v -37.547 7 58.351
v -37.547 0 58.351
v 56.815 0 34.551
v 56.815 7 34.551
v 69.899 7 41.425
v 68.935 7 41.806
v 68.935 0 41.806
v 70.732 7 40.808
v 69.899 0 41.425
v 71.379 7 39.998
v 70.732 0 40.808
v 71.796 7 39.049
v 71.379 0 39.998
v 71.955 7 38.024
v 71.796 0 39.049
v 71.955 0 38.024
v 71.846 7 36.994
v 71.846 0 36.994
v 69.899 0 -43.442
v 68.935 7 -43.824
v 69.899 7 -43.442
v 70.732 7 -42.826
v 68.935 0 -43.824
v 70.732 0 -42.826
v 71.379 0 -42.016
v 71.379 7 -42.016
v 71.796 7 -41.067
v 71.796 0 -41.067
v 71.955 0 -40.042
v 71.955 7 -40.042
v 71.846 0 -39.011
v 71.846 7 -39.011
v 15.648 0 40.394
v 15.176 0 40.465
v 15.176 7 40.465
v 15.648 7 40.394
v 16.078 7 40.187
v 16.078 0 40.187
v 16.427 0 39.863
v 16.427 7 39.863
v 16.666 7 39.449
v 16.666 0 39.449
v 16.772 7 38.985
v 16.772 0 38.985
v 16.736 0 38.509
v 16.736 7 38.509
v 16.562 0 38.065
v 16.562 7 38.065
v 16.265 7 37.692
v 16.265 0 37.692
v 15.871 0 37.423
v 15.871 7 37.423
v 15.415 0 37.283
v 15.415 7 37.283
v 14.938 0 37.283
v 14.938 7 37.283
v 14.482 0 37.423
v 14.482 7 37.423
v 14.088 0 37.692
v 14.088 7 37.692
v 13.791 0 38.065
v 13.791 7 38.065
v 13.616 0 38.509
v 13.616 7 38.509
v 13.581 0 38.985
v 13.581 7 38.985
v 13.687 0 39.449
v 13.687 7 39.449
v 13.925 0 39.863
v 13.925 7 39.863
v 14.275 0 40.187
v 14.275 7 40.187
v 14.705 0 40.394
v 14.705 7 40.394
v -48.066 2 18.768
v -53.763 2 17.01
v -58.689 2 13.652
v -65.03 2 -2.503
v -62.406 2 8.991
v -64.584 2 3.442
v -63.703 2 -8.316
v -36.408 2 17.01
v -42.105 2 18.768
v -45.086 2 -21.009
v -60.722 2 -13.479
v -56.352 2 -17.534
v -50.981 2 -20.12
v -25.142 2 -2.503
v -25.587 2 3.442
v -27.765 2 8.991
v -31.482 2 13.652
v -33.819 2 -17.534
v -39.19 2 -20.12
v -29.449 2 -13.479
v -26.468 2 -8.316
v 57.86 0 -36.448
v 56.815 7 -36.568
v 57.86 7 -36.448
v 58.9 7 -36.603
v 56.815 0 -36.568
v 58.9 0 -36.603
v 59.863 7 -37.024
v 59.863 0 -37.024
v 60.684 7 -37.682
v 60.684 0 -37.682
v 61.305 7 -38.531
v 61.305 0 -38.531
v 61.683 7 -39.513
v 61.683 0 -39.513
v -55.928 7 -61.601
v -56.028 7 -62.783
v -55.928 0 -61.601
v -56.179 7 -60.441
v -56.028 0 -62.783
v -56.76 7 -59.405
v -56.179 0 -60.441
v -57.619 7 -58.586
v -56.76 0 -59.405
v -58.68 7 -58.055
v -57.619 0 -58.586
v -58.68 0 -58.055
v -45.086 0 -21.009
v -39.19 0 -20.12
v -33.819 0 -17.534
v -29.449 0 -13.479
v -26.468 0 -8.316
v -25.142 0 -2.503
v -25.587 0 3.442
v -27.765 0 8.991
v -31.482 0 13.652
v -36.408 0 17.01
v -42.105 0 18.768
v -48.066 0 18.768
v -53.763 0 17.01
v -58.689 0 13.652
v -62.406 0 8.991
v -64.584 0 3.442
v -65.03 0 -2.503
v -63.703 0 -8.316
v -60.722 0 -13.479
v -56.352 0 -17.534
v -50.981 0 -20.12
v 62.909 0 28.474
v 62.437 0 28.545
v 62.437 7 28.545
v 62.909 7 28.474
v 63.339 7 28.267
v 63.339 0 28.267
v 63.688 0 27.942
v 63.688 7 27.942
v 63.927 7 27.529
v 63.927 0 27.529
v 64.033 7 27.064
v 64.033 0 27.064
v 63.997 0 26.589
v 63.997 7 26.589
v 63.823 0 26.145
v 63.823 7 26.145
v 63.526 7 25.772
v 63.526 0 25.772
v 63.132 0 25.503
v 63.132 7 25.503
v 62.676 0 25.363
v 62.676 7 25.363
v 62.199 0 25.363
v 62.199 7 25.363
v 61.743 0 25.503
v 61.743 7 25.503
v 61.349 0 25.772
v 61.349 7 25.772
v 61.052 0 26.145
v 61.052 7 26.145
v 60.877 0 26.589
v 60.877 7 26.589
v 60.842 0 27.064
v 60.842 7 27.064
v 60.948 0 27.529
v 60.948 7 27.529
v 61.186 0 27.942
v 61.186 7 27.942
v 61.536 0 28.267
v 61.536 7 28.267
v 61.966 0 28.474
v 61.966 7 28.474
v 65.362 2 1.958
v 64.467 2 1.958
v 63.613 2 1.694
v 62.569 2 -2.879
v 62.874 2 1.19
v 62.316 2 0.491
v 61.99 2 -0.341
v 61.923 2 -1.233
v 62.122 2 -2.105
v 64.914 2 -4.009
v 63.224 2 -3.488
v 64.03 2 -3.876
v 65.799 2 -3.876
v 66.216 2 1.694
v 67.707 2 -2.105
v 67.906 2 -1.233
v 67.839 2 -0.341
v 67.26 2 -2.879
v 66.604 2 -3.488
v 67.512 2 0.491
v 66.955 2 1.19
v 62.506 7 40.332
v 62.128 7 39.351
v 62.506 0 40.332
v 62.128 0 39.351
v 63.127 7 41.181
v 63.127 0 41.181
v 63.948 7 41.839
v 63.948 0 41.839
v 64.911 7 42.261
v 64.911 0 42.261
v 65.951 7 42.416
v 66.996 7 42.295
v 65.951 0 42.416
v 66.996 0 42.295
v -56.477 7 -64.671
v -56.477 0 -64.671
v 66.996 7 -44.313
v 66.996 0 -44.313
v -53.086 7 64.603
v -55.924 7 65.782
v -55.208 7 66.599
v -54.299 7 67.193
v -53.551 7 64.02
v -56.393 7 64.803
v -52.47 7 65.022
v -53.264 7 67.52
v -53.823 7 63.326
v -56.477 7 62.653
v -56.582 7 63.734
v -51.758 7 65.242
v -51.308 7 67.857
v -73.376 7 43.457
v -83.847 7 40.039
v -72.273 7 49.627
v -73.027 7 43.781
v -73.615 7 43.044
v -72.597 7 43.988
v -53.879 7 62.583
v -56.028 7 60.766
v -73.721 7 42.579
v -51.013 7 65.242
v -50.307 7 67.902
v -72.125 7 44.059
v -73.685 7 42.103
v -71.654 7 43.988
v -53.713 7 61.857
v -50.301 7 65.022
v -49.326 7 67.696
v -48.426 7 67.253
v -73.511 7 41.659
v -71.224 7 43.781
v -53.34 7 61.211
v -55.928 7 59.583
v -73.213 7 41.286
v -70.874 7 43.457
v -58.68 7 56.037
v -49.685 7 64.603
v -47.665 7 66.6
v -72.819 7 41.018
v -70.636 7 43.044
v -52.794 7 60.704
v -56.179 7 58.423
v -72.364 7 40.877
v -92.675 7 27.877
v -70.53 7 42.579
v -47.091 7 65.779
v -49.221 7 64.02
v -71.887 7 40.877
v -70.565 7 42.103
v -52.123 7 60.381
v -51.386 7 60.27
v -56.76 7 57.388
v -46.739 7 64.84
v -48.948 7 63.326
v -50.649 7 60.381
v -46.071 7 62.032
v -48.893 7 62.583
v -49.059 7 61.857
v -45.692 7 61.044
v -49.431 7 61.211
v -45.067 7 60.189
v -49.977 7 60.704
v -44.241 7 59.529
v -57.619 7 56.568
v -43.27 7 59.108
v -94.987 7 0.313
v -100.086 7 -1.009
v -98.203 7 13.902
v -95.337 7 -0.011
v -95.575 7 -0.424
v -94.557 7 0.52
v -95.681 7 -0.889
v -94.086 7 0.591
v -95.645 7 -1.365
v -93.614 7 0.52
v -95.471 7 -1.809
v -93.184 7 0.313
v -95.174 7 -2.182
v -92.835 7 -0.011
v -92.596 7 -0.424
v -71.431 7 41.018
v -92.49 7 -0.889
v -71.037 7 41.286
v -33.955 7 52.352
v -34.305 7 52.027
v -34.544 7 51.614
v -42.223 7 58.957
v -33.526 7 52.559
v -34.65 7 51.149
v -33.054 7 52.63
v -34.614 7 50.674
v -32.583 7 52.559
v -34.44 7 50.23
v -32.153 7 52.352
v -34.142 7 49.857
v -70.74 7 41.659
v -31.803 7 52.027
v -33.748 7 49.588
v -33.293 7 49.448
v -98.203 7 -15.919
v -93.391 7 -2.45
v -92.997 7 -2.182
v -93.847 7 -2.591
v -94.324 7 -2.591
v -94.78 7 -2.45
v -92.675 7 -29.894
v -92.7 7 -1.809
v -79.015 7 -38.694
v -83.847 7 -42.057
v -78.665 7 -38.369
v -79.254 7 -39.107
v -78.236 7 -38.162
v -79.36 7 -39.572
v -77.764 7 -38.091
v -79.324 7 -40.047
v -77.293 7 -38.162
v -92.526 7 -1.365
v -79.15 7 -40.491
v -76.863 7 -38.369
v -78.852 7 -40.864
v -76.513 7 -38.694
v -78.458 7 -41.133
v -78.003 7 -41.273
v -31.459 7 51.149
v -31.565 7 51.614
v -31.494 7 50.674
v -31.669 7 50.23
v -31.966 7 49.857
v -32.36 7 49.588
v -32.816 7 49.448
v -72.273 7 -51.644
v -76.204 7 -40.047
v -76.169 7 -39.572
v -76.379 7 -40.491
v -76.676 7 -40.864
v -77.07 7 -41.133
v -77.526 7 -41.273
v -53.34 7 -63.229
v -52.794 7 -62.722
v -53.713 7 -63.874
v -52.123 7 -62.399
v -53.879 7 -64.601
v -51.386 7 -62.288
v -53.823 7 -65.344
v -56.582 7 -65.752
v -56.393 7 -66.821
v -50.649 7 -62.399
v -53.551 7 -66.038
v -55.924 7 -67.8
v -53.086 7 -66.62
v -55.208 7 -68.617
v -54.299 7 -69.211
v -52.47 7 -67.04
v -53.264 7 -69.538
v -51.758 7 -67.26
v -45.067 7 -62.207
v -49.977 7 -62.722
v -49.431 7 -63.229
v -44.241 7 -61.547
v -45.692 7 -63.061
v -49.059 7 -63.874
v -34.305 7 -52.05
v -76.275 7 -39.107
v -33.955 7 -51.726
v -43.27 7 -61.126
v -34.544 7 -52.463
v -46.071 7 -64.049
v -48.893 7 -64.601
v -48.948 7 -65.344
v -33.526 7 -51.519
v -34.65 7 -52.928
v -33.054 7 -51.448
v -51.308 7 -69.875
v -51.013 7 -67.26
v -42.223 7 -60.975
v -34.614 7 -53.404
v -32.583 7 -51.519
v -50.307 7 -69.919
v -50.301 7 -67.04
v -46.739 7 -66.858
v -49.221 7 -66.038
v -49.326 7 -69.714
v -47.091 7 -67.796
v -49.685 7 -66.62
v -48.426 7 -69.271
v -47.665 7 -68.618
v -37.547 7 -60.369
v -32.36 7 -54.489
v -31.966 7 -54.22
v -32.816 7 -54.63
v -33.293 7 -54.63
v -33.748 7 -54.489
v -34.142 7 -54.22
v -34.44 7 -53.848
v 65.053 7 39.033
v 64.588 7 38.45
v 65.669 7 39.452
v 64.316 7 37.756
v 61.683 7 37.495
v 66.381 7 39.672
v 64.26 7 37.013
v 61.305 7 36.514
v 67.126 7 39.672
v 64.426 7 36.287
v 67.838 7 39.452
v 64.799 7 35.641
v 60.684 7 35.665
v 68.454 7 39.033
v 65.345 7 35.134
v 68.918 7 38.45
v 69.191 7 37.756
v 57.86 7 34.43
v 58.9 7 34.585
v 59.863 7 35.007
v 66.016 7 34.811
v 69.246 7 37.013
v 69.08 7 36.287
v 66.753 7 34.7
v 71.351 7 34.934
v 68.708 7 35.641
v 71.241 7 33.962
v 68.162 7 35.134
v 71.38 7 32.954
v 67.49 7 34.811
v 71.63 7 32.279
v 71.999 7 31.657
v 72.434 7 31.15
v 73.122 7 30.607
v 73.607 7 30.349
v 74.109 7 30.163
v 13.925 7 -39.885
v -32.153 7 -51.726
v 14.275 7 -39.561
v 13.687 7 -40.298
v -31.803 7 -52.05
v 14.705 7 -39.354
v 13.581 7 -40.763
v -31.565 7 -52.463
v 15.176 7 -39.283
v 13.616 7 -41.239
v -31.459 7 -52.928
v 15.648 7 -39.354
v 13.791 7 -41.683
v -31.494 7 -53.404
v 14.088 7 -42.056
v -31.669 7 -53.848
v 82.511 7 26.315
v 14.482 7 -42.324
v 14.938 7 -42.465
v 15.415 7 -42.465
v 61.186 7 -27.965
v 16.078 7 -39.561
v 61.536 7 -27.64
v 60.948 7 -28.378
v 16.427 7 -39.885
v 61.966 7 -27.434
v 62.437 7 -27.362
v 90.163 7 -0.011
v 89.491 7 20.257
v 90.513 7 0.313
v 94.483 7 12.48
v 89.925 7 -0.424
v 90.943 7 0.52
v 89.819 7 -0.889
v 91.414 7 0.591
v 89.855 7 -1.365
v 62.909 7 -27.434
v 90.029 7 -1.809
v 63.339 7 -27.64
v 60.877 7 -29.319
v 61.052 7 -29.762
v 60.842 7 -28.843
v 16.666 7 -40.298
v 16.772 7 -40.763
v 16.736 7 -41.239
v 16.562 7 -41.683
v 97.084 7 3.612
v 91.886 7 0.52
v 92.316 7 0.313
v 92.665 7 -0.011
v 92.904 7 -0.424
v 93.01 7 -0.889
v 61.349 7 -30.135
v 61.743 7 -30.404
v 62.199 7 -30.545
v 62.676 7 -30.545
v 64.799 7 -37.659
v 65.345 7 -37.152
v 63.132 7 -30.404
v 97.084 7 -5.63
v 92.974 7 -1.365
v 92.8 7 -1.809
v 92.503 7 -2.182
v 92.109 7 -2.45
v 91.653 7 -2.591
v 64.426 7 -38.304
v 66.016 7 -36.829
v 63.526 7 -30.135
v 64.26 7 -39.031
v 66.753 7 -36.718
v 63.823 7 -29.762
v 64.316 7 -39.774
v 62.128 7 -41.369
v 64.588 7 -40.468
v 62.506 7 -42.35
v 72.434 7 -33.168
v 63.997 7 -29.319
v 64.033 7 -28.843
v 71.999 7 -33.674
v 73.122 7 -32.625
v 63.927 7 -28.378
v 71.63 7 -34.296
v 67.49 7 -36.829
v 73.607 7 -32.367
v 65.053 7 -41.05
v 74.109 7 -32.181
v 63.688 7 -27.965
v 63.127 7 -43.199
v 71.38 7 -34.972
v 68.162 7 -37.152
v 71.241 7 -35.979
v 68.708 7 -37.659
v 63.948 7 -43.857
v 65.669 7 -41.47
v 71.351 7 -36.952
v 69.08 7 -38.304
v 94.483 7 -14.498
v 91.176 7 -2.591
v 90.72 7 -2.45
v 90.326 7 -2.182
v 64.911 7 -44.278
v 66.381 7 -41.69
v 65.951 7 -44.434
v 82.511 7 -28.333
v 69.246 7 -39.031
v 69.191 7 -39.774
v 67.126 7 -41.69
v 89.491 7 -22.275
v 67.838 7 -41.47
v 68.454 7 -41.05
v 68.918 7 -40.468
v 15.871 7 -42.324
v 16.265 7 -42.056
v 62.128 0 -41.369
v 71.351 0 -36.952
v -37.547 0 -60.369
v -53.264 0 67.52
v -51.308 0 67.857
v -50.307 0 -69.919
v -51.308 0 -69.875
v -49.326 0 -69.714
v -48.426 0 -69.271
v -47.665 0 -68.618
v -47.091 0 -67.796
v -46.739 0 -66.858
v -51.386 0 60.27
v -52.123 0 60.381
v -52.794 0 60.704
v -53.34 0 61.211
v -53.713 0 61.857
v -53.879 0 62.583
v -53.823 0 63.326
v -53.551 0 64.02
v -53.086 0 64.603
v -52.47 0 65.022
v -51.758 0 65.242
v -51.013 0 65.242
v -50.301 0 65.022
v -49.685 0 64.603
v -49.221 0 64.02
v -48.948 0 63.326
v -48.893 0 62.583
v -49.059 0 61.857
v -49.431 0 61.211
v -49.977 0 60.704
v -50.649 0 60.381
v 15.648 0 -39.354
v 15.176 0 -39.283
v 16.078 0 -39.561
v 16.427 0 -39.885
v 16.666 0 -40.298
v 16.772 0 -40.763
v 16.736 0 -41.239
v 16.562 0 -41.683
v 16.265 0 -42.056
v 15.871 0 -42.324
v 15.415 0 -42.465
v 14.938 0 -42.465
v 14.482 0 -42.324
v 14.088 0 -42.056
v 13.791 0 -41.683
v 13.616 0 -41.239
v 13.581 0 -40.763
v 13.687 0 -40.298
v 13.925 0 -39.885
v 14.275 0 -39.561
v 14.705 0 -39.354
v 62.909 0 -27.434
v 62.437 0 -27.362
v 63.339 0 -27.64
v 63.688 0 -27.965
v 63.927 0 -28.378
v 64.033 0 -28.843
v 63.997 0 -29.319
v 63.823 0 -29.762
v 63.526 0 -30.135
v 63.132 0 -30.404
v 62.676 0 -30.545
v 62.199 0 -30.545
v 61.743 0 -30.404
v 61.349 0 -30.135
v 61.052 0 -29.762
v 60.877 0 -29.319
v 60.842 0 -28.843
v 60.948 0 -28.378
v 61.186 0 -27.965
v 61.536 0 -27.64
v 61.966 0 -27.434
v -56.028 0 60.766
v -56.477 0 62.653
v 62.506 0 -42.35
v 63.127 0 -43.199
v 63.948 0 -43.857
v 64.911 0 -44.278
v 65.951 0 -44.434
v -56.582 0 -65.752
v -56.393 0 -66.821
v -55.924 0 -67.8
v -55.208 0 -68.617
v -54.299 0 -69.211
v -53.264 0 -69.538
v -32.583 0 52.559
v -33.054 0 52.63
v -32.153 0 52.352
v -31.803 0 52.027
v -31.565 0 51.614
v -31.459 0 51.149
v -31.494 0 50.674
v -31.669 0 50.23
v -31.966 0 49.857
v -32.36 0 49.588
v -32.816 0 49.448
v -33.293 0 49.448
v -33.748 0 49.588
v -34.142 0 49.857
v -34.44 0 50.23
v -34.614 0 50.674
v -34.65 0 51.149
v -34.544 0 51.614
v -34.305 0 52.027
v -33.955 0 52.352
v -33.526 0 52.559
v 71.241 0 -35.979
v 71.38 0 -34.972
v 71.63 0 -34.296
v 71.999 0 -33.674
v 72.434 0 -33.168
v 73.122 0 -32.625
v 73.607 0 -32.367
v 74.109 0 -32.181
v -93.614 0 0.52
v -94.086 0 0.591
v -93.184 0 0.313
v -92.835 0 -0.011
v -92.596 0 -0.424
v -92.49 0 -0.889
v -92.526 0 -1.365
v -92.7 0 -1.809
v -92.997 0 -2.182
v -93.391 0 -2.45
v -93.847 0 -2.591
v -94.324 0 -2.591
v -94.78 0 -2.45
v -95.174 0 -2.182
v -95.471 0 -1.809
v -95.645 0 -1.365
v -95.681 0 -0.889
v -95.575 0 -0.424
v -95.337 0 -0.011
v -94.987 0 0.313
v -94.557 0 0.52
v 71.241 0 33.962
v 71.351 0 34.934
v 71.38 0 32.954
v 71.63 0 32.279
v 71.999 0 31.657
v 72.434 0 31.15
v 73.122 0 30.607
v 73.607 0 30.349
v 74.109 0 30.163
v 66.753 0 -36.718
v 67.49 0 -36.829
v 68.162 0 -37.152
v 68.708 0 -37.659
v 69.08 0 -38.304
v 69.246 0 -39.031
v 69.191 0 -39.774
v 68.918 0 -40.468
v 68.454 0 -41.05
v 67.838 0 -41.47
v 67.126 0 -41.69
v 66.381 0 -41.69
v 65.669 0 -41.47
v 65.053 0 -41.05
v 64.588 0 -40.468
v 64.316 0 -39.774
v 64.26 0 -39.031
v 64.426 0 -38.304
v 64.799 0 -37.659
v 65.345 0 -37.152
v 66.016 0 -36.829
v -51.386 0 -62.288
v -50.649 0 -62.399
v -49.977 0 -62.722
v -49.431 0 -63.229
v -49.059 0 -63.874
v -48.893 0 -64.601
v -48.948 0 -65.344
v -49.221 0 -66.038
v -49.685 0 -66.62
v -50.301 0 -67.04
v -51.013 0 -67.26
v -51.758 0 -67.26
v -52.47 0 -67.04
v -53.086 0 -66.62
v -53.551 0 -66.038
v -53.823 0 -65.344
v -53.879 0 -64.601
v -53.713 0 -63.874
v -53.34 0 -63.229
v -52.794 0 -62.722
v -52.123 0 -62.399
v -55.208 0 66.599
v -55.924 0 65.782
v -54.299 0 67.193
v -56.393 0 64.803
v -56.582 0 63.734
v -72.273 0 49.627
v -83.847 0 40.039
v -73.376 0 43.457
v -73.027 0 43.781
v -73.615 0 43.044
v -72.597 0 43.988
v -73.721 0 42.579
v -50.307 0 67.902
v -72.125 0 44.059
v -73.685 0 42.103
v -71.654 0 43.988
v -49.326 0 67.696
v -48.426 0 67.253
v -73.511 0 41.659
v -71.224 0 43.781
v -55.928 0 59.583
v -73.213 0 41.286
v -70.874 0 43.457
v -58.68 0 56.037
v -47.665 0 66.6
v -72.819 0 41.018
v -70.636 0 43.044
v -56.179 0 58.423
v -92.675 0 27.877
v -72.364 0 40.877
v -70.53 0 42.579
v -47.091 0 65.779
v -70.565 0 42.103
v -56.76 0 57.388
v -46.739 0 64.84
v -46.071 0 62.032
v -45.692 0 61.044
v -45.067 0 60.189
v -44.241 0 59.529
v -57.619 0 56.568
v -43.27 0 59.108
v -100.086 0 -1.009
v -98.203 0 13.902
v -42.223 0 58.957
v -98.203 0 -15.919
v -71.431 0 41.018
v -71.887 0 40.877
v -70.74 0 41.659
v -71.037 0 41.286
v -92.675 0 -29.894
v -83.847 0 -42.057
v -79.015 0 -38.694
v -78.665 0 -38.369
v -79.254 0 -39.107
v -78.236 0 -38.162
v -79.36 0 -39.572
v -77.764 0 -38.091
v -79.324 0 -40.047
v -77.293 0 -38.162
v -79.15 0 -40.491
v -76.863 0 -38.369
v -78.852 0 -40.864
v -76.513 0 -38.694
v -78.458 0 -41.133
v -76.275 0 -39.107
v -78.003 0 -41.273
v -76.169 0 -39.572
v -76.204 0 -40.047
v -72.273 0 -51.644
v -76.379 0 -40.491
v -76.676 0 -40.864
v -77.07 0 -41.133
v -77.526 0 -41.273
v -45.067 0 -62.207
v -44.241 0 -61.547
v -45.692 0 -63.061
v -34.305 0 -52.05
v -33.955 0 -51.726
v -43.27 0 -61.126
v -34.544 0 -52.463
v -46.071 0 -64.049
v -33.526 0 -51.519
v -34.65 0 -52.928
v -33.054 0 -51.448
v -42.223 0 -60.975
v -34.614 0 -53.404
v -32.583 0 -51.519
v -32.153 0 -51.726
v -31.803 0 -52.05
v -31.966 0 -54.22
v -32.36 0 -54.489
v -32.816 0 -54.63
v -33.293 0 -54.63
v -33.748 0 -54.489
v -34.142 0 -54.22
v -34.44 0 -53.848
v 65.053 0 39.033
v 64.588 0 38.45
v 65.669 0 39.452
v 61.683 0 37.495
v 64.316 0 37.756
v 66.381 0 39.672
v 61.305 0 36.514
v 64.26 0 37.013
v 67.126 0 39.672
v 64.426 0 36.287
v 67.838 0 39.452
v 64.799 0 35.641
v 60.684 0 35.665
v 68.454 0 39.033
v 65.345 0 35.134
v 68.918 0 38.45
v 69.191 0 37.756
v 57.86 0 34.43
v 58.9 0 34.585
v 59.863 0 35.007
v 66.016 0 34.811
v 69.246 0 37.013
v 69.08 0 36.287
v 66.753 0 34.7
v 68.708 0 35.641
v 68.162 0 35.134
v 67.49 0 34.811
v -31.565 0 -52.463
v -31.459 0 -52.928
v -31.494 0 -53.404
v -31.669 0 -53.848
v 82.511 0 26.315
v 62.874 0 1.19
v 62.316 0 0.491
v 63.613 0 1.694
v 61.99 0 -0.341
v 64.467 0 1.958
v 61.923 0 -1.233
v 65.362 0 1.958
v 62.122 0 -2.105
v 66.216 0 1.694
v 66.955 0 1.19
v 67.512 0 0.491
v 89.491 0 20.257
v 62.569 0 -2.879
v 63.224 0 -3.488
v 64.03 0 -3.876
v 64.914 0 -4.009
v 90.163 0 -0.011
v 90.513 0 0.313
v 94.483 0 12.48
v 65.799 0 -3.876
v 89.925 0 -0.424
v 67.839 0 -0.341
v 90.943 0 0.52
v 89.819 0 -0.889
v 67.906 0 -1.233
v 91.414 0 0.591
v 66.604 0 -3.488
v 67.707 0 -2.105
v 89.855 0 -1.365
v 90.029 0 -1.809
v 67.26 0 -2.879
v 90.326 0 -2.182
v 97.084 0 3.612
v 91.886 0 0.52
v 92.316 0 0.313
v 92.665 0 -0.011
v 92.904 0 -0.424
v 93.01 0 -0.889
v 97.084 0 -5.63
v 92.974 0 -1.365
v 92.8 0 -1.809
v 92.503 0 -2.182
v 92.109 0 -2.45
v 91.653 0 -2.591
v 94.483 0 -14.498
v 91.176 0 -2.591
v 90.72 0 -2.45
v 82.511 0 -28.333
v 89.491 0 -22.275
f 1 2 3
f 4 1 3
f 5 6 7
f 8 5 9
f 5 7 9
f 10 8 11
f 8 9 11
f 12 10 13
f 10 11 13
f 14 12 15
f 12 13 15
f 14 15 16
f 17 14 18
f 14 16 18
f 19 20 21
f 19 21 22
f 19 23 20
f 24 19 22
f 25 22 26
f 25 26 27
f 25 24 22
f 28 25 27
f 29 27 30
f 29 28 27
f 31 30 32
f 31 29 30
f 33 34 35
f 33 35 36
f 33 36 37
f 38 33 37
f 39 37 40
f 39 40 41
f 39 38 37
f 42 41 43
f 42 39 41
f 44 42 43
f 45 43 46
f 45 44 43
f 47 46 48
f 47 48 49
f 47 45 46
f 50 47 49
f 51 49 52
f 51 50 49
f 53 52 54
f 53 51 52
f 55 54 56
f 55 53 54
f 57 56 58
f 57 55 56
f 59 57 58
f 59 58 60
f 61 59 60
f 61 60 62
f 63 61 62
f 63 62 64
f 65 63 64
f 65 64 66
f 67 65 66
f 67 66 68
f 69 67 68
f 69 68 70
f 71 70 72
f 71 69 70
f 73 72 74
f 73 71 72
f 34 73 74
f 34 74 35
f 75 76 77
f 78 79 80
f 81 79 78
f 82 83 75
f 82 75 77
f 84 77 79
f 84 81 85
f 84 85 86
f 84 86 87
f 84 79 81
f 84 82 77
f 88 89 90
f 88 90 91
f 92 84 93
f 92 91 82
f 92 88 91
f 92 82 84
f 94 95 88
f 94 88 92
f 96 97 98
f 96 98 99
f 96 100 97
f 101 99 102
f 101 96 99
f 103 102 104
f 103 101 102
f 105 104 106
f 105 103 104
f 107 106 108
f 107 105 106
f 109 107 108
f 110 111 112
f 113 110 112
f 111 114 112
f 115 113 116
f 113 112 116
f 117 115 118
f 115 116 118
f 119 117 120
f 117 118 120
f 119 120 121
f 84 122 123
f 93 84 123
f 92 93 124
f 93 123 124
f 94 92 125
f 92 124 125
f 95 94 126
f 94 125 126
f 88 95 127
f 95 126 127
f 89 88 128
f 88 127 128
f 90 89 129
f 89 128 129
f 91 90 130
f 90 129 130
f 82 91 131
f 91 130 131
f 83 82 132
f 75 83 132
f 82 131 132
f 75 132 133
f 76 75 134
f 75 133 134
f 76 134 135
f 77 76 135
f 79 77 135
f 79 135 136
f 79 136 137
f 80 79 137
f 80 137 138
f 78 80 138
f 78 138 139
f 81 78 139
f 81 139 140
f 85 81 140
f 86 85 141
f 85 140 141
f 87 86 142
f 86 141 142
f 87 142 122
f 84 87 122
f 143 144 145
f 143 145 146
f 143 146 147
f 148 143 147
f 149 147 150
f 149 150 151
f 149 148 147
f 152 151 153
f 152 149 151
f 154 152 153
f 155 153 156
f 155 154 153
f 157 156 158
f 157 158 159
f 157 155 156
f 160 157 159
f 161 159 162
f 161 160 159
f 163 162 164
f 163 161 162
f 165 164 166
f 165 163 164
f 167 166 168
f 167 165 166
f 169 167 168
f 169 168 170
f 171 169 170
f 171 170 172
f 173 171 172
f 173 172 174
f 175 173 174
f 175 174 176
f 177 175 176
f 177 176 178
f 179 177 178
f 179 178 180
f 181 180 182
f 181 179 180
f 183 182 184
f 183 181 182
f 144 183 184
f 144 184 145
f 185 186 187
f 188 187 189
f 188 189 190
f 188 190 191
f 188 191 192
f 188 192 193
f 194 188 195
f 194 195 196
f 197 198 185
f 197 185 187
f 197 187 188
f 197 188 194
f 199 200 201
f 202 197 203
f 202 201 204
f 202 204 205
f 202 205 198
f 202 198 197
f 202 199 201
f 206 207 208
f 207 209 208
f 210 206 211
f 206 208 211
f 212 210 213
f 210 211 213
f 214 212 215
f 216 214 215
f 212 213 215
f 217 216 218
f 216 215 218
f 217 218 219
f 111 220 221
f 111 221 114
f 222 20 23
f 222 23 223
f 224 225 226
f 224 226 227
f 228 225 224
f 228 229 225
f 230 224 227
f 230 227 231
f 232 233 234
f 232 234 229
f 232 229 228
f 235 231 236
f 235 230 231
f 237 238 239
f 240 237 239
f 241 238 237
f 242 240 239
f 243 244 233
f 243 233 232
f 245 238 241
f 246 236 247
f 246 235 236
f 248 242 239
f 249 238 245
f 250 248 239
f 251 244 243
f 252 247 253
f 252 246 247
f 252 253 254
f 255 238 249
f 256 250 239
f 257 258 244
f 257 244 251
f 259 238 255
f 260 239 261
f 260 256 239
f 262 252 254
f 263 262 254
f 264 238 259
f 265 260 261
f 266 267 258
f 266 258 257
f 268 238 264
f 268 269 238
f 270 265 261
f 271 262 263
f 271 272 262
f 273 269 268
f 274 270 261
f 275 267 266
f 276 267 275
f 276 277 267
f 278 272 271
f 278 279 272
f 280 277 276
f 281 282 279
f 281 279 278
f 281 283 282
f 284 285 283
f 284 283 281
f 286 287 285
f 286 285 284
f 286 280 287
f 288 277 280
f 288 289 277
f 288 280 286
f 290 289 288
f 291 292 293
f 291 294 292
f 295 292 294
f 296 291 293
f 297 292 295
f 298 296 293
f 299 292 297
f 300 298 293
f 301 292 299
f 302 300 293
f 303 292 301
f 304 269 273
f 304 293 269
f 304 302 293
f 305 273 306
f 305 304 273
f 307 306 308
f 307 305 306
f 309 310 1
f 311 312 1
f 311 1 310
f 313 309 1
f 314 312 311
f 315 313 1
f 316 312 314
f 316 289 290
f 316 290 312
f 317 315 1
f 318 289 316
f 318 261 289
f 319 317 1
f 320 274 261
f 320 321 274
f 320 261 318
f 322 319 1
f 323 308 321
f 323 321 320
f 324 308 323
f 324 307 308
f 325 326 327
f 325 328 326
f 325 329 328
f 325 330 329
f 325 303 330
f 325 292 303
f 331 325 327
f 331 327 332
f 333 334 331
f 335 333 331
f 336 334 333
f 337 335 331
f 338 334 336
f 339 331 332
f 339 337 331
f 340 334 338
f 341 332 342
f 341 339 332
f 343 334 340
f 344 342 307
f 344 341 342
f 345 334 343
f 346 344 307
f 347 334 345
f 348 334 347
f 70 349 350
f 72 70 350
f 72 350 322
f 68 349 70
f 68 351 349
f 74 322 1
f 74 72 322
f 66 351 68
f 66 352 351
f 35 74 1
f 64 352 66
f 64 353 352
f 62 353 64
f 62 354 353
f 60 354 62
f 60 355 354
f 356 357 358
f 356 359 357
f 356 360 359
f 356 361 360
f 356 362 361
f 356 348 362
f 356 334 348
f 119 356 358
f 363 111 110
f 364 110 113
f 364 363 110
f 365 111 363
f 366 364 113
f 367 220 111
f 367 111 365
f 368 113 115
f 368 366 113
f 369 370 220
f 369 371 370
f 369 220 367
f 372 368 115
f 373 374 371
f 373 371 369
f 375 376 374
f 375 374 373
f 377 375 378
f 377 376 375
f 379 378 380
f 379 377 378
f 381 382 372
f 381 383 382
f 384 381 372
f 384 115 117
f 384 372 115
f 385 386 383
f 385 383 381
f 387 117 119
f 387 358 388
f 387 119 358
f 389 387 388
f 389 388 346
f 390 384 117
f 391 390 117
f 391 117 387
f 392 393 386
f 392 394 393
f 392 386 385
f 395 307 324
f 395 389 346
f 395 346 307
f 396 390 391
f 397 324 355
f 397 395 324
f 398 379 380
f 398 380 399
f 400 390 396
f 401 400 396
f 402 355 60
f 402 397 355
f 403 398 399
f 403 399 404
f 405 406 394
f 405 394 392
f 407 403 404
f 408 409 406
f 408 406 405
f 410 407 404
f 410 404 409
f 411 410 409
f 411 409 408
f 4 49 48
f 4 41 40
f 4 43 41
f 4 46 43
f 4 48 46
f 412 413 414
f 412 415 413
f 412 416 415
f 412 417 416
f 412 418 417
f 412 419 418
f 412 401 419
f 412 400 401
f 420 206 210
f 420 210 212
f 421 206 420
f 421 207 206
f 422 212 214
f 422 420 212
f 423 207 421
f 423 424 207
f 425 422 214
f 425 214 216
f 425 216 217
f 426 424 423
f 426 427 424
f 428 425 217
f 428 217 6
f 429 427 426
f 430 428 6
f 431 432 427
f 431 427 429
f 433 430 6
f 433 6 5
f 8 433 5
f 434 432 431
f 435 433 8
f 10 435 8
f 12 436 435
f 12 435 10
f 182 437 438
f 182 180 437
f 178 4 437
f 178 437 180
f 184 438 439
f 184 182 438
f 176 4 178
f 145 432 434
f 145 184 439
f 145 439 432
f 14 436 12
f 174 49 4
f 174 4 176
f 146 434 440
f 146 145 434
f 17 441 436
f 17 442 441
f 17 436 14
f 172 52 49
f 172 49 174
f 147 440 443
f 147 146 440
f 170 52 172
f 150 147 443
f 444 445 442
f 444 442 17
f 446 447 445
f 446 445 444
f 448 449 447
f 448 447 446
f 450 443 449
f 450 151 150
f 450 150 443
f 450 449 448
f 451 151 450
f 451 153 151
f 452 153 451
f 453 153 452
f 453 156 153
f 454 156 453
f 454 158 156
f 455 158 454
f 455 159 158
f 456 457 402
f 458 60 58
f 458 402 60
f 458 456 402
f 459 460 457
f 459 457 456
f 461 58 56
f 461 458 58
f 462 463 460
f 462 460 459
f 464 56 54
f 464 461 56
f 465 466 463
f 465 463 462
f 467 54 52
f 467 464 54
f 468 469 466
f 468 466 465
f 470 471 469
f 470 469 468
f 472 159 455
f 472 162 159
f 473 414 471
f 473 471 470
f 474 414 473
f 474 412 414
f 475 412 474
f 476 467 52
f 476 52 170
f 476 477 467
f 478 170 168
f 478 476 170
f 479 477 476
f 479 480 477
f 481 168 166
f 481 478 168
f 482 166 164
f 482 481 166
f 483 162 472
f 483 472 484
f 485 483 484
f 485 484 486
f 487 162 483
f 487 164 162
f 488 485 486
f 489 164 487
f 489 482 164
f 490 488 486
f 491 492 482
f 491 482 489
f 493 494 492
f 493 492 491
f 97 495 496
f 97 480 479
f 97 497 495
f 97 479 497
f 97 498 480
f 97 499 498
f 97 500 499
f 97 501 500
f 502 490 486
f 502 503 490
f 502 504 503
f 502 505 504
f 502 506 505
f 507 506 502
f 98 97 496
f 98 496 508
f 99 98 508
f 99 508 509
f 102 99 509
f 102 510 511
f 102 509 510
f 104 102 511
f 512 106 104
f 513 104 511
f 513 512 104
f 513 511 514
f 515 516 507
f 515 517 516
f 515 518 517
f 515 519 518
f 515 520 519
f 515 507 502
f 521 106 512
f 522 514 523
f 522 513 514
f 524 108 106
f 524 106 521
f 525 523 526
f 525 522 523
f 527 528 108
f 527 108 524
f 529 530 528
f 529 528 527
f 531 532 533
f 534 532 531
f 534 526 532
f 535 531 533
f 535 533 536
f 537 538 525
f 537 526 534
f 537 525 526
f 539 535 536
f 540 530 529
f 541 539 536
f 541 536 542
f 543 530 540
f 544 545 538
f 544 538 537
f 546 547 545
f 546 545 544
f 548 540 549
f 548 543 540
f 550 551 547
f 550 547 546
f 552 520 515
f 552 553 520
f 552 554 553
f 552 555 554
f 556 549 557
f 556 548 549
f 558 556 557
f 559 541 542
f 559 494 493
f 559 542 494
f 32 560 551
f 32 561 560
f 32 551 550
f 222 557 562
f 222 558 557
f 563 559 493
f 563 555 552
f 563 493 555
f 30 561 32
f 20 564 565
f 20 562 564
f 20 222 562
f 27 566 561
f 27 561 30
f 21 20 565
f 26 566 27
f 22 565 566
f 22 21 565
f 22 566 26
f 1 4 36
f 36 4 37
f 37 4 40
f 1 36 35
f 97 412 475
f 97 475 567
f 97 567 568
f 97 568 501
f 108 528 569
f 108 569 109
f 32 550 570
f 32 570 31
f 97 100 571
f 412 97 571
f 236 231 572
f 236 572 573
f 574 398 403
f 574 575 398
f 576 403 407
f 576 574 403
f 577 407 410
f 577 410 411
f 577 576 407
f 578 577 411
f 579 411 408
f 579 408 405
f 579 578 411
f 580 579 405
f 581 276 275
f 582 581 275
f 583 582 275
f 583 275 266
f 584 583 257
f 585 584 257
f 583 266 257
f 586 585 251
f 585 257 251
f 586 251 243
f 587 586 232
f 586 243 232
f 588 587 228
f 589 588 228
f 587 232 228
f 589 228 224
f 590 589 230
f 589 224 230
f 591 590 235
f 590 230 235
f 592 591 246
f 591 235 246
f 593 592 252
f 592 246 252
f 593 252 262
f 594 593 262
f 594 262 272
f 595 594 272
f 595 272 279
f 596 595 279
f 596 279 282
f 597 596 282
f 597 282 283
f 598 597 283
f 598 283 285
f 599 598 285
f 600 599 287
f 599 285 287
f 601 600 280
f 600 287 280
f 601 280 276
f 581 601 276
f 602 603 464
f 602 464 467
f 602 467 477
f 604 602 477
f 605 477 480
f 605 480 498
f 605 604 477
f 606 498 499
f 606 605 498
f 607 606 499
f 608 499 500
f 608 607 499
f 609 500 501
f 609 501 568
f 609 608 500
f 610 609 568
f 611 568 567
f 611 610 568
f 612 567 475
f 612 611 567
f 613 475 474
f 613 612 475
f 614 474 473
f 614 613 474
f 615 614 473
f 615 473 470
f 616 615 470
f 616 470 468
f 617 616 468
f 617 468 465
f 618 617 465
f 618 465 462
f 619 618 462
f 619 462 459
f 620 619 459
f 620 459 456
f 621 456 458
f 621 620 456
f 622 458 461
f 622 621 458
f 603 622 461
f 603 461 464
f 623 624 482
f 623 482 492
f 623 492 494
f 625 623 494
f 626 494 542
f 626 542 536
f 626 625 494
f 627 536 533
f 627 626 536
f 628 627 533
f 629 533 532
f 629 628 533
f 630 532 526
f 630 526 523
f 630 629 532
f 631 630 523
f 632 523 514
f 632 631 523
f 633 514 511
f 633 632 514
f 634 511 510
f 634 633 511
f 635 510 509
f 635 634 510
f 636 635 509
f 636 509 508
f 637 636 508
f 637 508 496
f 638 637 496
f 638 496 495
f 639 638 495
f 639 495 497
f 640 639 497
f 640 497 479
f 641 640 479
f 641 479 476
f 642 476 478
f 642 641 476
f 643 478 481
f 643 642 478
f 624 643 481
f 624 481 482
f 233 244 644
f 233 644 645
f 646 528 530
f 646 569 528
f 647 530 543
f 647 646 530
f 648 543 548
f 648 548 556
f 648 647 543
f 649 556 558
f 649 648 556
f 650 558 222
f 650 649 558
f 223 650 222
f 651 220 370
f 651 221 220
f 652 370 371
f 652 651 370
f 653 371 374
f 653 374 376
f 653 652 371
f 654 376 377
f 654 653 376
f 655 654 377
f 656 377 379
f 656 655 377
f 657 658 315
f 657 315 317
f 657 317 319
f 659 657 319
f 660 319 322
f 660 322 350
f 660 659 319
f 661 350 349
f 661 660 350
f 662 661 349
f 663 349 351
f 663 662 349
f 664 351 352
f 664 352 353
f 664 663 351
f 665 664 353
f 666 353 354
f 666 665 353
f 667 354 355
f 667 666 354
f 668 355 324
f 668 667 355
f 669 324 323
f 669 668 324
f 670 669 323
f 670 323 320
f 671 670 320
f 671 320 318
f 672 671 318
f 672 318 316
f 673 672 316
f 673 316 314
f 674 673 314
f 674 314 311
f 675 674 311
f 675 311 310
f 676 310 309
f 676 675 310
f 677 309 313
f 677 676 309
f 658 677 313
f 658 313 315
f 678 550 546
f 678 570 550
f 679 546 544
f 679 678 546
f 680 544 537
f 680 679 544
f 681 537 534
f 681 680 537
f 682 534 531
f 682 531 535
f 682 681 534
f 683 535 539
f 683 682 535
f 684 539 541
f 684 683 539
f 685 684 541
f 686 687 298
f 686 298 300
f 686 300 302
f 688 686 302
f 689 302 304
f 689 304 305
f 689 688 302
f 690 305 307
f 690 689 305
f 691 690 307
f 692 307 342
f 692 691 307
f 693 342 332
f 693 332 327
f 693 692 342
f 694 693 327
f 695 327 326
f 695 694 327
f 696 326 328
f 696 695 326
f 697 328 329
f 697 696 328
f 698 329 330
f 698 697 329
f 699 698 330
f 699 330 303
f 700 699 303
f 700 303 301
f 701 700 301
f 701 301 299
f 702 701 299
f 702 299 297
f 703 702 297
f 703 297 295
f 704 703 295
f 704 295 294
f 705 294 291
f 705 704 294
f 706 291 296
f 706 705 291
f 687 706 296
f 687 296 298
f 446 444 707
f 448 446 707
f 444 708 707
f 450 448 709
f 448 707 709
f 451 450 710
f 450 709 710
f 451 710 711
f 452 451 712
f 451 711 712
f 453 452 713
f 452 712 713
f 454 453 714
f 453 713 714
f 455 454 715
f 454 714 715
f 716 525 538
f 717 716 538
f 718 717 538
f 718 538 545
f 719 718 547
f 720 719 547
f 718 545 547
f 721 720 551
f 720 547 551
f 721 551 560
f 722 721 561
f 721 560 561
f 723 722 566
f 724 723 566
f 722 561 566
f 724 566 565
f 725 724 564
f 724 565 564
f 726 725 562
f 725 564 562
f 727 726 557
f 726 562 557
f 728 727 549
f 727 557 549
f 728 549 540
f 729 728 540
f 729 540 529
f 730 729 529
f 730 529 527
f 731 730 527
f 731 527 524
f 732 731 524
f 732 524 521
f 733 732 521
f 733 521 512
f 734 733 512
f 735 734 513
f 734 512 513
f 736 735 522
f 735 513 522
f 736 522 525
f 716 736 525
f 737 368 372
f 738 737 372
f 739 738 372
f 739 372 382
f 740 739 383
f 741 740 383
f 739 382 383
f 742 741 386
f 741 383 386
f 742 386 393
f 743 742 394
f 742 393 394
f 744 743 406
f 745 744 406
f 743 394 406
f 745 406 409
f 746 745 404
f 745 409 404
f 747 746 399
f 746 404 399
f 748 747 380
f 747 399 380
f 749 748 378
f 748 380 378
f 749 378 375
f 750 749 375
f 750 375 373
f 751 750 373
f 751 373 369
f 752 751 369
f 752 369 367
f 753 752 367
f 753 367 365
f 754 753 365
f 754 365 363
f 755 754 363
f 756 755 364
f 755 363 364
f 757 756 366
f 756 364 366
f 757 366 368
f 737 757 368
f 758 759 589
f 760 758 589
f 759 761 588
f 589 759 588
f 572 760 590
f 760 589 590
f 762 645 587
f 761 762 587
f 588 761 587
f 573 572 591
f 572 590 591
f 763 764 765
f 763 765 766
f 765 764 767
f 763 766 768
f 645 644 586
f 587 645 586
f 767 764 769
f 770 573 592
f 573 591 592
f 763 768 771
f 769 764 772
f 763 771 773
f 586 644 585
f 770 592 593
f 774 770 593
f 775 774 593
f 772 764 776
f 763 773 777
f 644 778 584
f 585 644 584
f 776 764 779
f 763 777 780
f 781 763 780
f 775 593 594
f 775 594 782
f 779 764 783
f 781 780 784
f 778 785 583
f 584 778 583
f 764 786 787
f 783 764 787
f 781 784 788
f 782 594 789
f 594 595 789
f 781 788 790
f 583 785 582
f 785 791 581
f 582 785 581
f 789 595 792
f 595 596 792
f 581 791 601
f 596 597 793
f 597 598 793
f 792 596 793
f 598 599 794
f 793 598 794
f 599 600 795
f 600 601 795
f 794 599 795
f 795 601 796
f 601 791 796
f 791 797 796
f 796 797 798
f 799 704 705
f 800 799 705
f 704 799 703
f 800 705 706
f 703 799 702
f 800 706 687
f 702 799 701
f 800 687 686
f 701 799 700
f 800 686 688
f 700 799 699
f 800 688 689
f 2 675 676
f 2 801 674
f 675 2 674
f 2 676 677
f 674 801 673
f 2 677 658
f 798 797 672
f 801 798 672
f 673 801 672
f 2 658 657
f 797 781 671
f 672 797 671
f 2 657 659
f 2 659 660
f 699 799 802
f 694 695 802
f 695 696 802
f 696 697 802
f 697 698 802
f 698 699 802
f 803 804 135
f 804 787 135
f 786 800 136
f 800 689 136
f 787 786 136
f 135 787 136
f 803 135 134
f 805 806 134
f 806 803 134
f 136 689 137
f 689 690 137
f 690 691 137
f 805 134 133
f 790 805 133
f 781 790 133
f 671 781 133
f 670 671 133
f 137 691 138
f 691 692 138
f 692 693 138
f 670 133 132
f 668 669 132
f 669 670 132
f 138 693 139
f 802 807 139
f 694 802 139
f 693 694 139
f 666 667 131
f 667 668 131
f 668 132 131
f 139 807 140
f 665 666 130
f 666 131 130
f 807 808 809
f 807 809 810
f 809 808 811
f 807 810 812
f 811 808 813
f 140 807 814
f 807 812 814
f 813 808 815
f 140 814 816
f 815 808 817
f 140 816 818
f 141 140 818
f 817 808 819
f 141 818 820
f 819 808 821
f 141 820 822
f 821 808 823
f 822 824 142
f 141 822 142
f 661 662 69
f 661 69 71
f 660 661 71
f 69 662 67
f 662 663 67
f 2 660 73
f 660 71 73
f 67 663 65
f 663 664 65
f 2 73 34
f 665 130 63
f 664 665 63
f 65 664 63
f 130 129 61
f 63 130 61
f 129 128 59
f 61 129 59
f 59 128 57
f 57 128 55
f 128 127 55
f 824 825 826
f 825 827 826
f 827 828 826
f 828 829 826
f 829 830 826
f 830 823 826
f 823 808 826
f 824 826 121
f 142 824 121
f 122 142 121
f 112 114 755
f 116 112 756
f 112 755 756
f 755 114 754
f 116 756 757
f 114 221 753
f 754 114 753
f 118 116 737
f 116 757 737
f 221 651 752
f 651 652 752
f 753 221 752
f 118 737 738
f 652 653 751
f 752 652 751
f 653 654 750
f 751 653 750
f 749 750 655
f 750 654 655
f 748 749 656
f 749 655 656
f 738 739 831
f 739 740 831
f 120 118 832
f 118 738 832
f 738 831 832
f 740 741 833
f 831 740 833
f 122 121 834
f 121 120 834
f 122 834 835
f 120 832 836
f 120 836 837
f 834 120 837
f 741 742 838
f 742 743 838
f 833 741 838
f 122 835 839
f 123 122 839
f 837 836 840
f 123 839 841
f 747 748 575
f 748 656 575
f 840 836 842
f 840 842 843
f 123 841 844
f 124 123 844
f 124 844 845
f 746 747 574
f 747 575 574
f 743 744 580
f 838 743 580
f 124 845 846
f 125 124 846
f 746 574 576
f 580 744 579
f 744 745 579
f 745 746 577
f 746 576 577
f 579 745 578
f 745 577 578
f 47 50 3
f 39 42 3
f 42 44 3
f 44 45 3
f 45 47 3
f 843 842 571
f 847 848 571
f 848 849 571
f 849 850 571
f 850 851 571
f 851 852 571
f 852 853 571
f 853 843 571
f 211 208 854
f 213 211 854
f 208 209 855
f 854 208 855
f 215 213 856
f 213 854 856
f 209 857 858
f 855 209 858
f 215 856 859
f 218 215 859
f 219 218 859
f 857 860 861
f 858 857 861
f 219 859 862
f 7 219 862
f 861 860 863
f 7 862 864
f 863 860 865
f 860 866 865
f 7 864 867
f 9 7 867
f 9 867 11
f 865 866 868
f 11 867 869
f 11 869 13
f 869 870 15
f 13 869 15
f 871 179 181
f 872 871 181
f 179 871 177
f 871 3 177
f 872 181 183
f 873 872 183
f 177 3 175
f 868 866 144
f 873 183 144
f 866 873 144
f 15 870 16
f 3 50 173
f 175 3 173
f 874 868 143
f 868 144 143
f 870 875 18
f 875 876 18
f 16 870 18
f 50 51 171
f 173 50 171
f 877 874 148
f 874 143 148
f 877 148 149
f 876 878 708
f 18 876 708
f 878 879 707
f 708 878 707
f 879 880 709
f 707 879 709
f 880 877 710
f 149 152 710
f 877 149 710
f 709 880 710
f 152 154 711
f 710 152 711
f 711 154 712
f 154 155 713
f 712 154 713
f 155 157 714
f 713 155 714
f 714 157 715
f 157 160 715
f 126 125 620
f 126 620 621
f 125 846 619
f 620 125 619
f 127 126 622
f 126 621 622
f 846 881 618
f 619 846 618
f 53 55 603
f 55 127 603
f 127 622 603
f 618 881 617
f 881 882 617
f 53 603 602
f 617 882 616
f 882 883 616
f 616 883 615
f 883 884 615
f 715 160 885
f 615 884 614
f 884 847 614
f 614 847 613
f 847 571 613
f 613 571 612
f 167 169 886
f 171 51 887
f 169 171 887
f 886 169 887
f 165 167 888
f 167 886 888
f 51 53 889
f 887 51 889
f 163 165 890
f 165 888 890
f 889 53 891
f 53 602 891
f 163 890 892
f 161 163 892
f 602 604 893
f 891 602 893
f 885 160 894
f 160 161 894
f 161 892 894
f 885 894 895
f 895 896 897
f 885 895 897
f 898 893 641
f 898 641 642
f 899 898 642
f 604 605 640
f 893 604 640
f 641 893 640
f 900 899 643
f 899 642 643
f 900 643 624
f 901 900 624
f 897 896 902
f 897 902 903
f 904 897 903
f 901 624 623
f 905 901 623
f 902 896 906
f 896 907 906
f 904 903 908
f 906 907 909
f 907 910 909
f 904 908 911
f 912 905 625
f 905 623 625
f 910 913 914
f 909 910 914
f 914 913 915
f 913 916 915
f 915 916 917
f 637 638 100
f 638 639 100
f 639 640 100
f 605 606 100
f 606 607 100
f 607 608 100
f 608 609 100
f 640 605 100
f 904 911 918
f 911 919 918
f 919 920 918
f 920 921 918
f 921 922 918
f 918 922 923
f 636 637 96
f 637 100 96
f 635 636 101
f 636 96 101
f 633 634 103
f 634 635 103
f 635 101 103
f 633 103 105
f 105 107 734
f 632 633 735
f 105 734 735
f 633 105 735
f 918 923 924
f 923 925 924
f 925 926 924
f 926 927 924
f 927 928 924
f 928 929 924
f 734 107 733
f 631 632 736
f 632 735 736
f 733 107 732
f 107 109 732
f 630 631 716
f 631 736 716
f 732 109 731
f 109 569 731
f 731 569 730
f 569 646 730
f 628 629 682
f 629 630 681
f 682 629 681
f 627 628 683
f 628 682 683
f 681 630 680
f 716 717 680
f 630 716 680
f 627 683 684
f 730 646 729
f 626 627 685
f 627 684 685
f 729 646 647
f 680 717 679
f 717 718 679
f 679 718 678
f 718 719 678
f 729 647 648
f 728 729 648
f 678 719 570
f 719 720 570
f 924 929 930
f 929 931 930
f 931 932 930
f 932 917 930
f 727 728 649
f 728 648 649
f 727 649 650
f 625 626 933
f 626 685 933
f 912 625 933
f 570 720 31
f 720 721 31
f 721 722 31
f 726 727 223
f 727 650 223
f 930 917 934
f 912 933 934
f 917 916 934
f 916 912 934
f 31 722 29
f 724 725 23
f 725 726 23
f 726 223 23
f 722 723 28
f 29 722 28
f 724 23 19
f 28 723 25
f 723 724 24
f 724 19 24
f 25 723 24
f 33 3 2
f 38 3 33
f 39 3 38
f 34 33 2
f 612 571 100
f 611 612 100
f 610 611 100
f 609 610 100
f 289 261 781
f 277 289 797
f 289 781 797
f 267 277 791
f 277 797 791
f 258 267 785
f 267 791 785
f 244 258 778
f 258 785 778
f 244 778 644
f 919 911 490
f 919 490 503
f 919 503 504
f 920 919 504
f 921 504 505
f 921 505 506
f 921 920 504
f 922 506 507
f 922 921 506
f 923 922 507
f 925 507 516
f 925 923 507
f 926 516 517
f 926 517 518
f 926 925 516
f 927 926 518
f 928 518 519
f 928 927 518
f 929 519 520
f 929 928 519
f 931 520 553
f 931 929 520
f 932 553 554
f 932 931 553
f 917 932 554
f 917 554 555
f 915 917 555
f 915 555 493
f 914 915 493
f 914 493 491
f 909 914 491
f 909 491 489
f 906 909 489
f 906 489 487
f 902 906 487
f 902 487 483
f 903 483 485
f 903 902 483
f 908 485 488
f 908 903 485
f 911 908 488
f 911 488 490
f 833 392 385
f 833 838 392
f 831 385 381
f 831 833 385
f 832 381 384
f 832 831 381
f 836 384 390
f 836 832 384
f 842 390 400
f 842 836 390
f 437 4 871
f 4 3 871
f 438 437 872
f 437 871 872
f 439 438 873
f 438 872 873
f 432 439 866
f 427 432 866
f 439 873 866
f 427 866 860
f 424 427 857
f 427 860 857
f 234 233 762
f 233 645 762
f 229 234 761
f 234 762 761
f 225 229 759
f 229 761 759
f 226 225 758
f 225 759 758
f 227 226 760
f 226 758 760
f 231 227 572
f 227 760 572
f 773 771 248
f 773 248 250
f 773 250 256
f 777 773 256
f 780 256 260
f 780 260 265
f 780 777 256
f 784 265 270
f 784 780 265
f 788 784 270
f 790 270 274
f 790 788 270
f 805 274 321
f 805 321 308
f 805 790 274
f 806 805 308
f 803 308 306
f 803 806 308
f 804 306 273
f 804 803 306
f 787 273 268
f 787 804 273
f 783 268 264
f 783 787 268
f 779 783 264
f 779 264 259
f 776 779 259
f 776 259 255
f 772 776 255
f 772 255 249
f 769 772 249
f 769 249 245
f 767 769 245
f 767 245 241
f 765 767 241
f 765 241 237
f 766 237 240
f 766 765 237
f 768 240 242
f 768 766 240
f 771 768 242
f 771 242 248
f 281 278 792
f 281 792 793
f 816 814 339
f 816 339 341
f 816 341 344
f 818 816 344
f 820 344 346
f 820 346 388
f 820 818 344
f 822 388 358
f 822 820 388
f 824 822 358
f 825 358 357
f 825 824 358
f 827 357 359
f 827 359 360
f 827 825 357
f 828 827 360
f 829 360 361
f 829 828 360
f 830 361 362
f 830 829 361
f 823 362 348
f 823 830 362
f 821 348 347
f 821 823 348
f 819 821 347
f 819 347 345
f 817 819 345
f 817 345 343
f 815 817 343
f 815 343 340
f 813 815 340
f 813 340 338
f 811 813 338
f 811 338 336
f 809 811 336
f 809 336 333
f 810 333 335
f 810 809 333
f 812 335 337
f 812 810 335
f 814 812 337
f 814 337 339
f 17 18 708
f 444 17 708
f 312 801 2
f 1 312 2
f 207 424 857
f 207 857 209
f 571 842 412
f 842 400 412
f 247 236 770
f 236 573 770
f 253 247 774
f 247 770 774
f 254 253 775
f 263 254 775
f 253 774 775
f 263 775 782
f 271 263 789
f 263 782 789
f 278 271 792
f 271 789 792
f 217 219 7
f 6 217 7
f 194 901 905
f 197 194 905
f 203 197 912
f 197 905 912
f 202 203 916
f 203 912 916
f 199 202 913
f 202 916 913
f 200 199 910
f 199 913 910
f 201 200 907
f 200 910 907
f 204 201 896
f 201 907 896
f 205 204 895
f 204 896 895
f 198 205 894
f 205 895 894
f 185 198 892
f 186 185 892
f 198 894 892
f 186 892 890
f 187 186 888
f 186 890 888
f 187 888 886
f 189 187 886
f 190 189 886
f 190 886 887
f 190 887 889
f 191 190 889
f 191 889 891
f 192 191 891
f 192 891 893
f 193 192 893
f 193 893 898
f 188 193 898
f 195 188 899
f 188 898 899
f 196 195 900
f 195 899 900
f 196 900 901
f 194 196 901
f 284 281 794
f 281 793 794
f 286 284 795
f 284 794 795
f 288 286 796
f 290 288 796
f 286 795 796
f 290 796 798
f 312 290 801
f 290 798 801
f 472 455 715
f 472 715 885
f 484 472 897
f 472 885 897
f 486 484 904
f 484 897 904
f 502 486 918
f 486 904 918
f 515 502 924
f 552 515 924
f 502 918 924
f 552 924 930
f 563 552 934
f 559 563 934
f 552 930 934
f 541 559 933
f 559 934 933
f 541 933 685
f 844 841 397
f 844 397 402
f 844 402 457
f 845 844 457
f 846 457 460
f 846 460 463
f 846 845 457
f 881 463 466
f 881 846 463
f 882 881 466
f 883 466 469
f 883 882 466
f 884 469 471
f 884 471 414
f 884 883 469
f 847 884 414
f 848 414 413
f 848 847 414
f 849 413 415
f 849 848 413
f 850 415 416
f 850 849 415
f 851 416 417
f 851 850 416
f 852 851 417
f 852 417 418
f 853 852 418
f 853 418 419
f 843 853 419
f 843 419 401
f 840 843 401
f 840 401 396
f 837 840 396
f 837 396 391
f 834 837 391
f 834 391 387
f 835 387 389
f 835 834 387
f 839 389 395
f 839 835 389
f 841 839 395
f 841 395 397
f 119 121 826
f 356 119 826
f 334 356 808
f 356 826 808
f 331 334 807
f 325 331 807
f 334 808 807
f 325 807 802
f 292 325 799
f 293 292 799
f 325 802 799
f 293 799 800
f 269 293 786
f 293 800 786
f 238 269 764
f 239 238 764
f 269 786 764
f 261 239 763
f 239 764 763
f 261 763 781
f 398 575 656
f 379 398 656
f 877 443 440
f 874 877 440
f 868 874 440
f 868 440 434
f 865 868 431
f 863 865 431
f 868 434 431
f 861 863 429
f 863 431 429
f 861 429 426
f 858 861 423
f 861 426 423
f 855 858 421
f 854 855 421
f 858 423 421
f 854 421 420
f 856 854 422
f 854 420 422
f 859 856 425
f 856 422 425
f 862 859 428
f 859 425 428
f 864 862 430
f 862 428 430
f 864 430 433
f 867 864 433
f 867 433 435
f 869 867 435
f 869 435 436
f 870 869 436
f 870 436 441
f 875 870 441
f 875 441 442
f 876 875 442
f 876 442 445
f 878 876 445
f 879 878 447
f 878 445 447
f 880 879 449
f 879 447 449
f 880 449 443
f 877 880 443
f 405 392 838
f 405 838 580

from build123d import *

# Parameters (mm, degrees)
SKETCH1_R           = 1.6
BOSS_EXTRUDE1_DEPTH = 7
BOSS_EXTRUDE2_DEPTH = 7
SKETCH3_R           = 2.5
CUT_EXTRUDE1_DEPTH  = 7
FILLET1_R           = 4
FILLET2_R           = 20
SKETCH5_R           = 20
SKETCH5_R_2         = 3
CUT_EXTRUDE3_DEPTH  = 2


with BuildPart() as part:
    # Sketch1 → Boss-Extrude1 (new body)
    with BuildSketch(Plane(origin=(0, 0, 0), x_dir=(1, 0, 0), z_dir=(0, 1, 0))):
        with BuildLine():
            Line((-40.085587865, -58.991121495), (72.606562154, -30.567708203))
            ThreePointArc((72.606562154, -30.567708203), (97.414412135, 1.008878505), (72.606562154, 32.585465212))
            Line((72.606562154, 32.585465212), (-40.085587865, 61.008878505))
            ThreePointArc((-40.085587865, 61.008878505), (-100.085587865, 1.008878505), (-40.085587865, -58.991121495))
        make_face()
        with Locations(Location((15.176377483, -38.864945804, 0), (0, 0, 270))):
            Circle(SKETCH1_R, mode=Mode.SUBTRACT)
        with Locations(Location((-33.054187001, -51.02974404, 0), (0, 0, 270))):
            Circle(SKETCH1_R, mode=Mode.SUBTRACT)
        with Locations(Location((62.43730848, -26.944710242, 0), (0, 0, 270))):
            Circle(SKETCH1_R, mode=Mode.SUBTRACT)
        with Locations(Location((91.414412135, 1.008878505, 0), (0, 0, 270))):
            Circle(SKETCH1_R, mode=Mode.SUBTRACT)
        with Locations(Location((-33.054187001, 53.047501049, 0), (0, 0, 270))):
            Circle(SKETCH1_R, mode=Mode.SUBTRACT)
        with Locations(Location((15.176377483, 40.882702814, 0), (0, 0, 270))):
            Circle(SKETCH1_R, mode=Mode.SUBTRACT)
        with Locations(Location((62.43730848, 28.962467251, 0), (0, 0, 270))):
            Circle(SKETCH1_R, mode=Mode.SUBTRACT)
        with Locations(Location((-94.085587865, 1.008878505, 0), (0, 0, 270))):
            Circle(SKETCH1_R, mode=Mode.SUBTRACT)
        with Locations(Location((-72.125195915, -42.459081144, 0), (0, 0, 270))):
            Circle(SKETCH1_R, mode=Mode.SUBTRACT)
        with Locations(Location((-77.764180777, 39.691221197, 0), (0, 0, 270))):
            Circle(SKETCH1_R, mode=Mode.SUBTRACT)
    extrude(amount=BOSS_EXTRUDE1_DEPTH)

    # Sketch2 → Boss-Extrude2 (add)
    with BuildSketch(Plane(origin=(0, 7, 0), x_dir=(1, 0, 0), z_dir=(0, 1, 0))):
        Polygon((-55.149276996, 59.087146986), (-45.294016341, 60.782386623), (-47.607258378, 70.511153826), (-57.462519032, 68.815914188), align=None)
        Polygon((60.73773507, 35.579041761), (70.434069941, 33.133415038), (72.769614826, 42.856852192), (63.073279955, 45.302478915), align=None)
        Polygon((63.073279955, -43.284721905), (72.769614826, -40.839095183), (70.434069941, -31.115658029), (60.73773507, -33.561284751), align=None)
        Polygon((-57.462519032, -66.798157179), (-47.607258378, -68.493396816), (-45.294016341, -58.764629614), (-55.149276996, -57.069389977), align=None)
    extrude(amount=-BOSS_EXTRUDE2_DEPTH)

    # Sketch3 → Cut-Extrude1 (cut)
    with BuildSketch(Plane(origin=(0, 7, 0), x_dir=(1, 0, 0), z_dir=(0, 1, 0))):
        with Locations(Location((-51.385785587, 64.787762931, 0), (0, 0, 270))):
            Circle(SKETCH3_R)
        with Locations(Location((66.753288323, 39.217713116, 0), (0, 0, 270))):
            Circle(SKETCH3_R)
        with Locations(Location((66.753288323, -37.199956106, 0), (0, 0, 90))):
            Circle(SKETCH3_R)
        with Locations(Location((-51.385785587, -62.770005922, 0), (0, 0, 90))):
            Circle(SKETCH3_R)
    extrude(amount=-CUT_EXTRUDE1_DEPTH, mode=Mode.SUBTRACT)

    # Fillet1
    fillet1_edges = [part.edges().sort_by_distance(p)[0] for p in [
        (-55.149276996, 3.5, 57.069389977),
        (-57.462519032, 3.5, 66.798157179),
        (-47.607258378, 3.5, 68.493396816),
        (-45.294016341, 3.5, 58.764629614),
        (70.434069941, 3.5, 31.115658029),
        (72.769614826, 3.5, 40.839095183),
        (63.073279955, 3.5, 43.284721905),
        (60.73773507, 3.5, 33.561284751),
        (60.73773507, 3.5, -35.579041761),
        (63.073279955, 3.5, -45.302478915),
        (72.769614826, 3.5, -42.856852192),
        (70.434069941, 3.5, -33.133415038),
        (-45.294016341, 3.5, -60.782386623),
        (-55.149276996, 3.5, -59.087146986),
        (-47.607258378, 3.5, -70.511153826),
        (-57.462519032, 3.5, -68.815914188),
    ]]
    fillet(fillet1_edges, radius=FILLET1_R)

    # Fillet2
    fillet2_edges = [part.edges().sort_by_distance(p)[0] for p in [
        (-40.085587865, 3.5, 58.991121495),
        (-40.085587865, 3.5, -61.008878505),
    ]]
    fillet(fillet2_edges, radius=FILLET2_R)

    # Sketch5 → Cut-Extrude3 (cut)
    with BuildSketch(Plane.XZ):
        with Locations(Location((-45.085587865, -1.008878505, 0), (0, 0, 270))):
            Circle(SKETCH5_R)
        with Locations(Location((64.914412135, -1.008878505, 0), (0, 0, 270))):
            Circle(SKETCH5_R_2)
    extrude(amount=-CUT_EXTRUDE3_DEPTH, mode=Mode.SUBTRACT)


solid = part.part
